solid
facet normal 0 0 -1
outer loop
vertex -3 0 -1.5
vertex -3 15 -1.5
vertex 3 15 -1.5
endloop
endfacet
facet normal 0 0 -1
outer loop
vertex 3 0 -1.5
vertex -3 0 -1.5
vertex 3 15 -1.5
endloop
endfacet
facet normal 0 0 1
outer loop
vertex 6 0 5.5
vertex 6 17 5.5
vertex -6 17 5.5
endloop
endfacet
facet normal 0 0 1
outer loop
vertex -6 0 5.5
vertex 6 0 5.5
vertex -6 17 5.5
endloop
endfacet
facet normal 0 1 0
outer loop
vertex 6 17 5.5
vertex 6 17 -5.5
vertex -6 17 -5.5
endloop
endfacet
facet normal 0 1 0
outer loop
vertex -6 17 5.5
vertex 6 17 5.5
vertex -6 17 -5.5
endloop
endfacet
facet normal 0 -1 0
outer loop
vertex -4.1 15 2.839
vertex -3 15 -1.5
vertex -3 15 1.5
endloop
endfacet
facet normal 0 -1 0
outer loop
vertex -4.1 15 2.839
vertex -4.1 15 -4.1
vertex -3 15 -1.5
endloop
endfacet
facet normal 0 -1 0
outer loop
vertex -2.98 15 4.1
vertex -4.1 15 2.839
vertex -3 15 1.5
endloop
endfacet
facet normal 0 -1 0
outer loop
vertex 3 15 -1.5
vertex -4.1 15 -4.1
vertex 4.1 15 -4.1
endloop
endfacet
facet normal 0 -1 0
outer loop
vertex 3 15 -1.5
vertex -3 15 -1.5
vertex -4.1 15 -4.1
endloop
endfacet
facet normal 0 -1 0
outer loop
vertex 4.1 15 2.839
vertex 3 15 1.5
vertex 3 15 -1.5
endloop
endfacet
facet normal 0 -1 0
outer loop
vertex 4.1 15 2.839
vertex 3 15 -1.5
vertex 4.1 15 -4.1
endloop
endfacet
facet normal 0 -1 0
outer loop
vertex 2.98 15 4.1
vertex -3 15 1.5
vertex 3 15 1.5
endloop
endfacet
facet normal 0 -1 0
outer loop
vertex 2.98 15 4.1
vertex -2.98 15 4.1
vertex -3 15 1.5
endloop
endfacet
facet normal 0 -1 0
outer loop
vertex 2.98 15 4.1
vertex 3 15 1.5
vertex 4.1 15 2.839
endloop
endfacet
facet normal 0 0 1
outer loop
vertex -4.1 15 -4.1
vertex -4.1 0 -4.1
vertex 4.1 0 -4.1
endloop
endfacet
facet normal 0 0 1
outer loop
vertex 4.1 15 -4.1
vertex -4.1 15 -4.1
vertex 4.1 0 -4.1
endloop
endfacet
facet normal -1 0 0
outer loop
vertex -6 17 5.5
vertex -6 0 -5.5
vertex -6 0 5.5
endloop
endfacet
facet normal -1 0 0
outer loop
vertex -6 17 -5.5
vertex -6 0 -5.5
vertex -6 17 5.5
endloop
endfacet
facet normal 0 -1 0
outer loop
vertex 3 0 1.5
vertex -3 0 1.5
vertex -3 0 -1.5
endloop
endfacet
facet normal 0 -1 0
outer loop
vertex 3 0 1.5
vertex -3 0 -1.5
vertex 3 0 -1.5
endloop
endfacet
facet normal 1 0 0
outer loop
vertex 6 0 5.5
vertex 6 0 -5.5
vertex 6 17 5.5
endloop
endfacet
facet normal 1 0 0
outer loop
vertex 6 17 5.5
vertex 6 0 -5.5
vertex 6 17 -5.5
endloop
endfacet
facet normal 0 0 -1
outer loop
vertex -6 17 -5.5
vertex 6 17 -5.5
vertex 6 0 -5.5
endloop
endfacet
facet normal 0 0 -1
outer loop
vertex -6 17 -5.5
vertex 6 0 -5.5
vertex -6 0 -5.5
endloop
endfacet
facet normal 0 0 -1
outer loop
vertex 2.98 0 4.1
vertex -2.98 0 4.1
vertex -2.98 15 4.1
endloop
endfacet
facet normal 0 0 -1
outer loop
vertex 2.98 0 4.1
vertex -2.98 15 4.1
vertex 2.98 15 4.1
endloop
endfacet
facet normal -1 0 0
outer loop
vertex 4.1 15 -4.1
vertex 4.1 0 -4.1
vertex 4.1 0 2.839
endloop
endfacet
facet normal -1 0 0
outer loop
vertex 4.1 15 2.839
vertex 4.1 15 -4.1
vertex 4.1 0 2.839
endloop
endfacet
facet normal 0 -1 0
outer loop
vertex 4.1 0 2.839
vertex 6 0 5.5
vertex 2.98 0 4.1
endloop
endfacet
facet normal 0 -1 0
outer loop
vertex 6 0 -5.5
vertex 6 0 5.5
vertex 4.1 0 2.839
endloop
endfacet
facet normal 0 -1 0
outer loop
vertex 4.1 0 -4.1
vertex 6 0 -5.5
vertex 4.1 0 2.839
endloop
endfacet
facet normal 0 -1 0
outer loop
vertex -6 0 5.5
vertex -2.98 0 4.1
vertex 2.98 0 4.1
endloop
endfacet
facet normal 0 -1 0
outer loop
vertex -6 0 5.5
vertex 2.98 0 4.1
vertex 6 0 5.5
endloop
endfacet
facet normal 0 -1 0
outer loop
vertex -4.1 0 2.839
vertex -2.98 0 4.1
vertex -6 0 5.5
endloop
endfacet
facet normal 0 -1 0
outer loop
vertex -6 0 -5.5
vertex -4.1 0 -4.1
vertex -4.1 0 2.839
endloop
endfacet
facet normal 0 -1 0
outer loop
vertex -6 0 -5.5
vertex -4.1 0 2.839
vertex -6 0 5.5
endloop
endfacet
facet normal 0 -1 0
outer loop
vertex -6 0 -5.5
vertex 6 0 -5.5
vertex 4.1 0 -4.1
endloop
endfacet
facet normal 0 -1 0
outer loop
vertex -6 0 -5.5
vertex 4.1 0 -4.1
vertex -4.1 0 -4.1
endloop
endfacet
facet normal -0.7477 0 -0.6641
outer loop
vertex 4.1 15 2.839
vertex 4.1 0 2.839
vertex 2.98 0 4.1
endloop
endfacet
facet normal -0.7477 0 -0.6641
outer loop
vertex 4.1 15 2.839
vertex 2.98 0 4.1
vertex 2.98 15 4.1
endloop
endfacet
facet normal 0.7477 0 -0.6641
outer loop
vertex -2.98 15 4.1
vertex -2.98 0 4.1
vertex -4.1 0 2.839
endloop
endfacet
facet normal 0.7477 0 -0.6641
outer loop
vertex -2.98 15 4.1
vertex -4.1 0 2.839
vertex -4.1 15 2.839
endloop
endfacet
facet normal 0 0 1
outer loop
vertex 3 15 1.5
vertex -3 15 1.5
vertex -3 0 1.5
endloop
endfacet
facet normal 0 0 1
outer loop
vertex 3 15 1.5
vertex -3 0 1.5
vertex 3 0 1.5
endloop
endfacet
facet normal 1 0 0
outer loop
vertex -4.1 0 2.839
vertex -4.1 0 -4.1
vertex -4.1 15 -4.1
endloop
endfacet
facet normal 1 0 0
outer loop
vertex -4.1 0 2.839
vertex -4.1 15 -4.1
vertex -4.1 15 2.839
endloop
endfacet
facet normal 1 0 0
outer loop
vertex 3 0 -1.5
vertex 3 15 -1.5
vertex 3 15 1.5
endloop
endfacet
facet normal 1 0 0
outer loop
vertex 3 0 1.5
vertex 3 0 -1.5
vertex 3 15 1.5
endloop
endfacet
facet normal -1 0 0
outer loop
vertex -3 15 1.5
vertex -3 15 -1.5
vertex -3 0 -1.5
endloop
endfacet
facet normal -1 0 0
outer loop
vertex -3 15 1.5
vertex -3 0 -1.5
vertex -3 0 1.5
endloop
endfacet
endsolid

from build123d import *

# Parameters (mm, degrees)
SKETCH1_W           = 12
SKETCH1_H           = 17
BOSS_EXTRUDE1_DEPTH = 11
SKETCH2_W           = 8.2
SKETCH2_H           = 8.2
CUT_EXTRUDE1_DEPTH  = 15
SKETCH3_W           = 6
SKETCH3_H           = 3
BOSS_EXTRUDE2_DEPTH = 15
CHAMFER1_SIZE       = 1.120110988
CHAMFER1_SIZE2      = 1.260754717
CHAMFER2_SIZE       = 1.260754717
CHAMFER2_SIZE2      = 1.120110988


with BuildPart() as part:
    # Sketch1 → Boss-Extrude1 (new body)
    with BuildSketch(Plane(origin=(0, 0, -5.5), x_dir=(-1, 0, 0), z_dir=(0, 0, -1))):
        with Locations((0, 8.5)):
            Rectangle(SKETCH1_W, SKETCH1_H)
    extrude(amount=-BOSS_EXTRUDE1_DEPTH)

    # Sketch2 → Cut-Extrude1 (cut)
    with BuildSketch(Plane.XZ):
        Rectangle(SKETCH2_W, SKETCH2_H)
    extrude(amount=-CUT_EXTRUDE1_DEPTH, mode=Mode.SUBTRACT)

    # Sketch3 → Boss-Extrude2 (add)
    with BuildSketch(Plane.XZ.offset(-15)):
        Rectangle(SKETCH3_W, SKETCH3_H)
    extrude(amount=BOSS_EXTRUDE2_DEPTH)

    # Chamfer1
    chamfer1_edges = [part.edges().sort_by_distance(p)[0] for p in [
        (4.1, 7.5, 4.1),
    ]]
    chamfer1_side = [part.faces().sort_by_distance(p)[0] for p in [
        (0, 7.5, 4.1),
    ]]
    chamfer(chamfer1_edges, length=CHAMFER1_SIZE, length2=CHAMFER1_SIZE2, reference=chamfer1_side[0])

    # Chamfer2
    chamfer2_edges = [part.edges().sort_by_distance(p)[0] for p in [
        (-4.1, 7.5, 4.1),
    ]]
    chamfer2_side = [part.faces().sort_by_distance(p)[0] for p in [
        (-4.1, 7.5, 0),
    ]]
    chamfer(chamfer2_edges, length=CHAMFER2_SIZE, length2=CHAMFER2_SIZE2, reference=chamfer2_side[0])


solid = part.part
